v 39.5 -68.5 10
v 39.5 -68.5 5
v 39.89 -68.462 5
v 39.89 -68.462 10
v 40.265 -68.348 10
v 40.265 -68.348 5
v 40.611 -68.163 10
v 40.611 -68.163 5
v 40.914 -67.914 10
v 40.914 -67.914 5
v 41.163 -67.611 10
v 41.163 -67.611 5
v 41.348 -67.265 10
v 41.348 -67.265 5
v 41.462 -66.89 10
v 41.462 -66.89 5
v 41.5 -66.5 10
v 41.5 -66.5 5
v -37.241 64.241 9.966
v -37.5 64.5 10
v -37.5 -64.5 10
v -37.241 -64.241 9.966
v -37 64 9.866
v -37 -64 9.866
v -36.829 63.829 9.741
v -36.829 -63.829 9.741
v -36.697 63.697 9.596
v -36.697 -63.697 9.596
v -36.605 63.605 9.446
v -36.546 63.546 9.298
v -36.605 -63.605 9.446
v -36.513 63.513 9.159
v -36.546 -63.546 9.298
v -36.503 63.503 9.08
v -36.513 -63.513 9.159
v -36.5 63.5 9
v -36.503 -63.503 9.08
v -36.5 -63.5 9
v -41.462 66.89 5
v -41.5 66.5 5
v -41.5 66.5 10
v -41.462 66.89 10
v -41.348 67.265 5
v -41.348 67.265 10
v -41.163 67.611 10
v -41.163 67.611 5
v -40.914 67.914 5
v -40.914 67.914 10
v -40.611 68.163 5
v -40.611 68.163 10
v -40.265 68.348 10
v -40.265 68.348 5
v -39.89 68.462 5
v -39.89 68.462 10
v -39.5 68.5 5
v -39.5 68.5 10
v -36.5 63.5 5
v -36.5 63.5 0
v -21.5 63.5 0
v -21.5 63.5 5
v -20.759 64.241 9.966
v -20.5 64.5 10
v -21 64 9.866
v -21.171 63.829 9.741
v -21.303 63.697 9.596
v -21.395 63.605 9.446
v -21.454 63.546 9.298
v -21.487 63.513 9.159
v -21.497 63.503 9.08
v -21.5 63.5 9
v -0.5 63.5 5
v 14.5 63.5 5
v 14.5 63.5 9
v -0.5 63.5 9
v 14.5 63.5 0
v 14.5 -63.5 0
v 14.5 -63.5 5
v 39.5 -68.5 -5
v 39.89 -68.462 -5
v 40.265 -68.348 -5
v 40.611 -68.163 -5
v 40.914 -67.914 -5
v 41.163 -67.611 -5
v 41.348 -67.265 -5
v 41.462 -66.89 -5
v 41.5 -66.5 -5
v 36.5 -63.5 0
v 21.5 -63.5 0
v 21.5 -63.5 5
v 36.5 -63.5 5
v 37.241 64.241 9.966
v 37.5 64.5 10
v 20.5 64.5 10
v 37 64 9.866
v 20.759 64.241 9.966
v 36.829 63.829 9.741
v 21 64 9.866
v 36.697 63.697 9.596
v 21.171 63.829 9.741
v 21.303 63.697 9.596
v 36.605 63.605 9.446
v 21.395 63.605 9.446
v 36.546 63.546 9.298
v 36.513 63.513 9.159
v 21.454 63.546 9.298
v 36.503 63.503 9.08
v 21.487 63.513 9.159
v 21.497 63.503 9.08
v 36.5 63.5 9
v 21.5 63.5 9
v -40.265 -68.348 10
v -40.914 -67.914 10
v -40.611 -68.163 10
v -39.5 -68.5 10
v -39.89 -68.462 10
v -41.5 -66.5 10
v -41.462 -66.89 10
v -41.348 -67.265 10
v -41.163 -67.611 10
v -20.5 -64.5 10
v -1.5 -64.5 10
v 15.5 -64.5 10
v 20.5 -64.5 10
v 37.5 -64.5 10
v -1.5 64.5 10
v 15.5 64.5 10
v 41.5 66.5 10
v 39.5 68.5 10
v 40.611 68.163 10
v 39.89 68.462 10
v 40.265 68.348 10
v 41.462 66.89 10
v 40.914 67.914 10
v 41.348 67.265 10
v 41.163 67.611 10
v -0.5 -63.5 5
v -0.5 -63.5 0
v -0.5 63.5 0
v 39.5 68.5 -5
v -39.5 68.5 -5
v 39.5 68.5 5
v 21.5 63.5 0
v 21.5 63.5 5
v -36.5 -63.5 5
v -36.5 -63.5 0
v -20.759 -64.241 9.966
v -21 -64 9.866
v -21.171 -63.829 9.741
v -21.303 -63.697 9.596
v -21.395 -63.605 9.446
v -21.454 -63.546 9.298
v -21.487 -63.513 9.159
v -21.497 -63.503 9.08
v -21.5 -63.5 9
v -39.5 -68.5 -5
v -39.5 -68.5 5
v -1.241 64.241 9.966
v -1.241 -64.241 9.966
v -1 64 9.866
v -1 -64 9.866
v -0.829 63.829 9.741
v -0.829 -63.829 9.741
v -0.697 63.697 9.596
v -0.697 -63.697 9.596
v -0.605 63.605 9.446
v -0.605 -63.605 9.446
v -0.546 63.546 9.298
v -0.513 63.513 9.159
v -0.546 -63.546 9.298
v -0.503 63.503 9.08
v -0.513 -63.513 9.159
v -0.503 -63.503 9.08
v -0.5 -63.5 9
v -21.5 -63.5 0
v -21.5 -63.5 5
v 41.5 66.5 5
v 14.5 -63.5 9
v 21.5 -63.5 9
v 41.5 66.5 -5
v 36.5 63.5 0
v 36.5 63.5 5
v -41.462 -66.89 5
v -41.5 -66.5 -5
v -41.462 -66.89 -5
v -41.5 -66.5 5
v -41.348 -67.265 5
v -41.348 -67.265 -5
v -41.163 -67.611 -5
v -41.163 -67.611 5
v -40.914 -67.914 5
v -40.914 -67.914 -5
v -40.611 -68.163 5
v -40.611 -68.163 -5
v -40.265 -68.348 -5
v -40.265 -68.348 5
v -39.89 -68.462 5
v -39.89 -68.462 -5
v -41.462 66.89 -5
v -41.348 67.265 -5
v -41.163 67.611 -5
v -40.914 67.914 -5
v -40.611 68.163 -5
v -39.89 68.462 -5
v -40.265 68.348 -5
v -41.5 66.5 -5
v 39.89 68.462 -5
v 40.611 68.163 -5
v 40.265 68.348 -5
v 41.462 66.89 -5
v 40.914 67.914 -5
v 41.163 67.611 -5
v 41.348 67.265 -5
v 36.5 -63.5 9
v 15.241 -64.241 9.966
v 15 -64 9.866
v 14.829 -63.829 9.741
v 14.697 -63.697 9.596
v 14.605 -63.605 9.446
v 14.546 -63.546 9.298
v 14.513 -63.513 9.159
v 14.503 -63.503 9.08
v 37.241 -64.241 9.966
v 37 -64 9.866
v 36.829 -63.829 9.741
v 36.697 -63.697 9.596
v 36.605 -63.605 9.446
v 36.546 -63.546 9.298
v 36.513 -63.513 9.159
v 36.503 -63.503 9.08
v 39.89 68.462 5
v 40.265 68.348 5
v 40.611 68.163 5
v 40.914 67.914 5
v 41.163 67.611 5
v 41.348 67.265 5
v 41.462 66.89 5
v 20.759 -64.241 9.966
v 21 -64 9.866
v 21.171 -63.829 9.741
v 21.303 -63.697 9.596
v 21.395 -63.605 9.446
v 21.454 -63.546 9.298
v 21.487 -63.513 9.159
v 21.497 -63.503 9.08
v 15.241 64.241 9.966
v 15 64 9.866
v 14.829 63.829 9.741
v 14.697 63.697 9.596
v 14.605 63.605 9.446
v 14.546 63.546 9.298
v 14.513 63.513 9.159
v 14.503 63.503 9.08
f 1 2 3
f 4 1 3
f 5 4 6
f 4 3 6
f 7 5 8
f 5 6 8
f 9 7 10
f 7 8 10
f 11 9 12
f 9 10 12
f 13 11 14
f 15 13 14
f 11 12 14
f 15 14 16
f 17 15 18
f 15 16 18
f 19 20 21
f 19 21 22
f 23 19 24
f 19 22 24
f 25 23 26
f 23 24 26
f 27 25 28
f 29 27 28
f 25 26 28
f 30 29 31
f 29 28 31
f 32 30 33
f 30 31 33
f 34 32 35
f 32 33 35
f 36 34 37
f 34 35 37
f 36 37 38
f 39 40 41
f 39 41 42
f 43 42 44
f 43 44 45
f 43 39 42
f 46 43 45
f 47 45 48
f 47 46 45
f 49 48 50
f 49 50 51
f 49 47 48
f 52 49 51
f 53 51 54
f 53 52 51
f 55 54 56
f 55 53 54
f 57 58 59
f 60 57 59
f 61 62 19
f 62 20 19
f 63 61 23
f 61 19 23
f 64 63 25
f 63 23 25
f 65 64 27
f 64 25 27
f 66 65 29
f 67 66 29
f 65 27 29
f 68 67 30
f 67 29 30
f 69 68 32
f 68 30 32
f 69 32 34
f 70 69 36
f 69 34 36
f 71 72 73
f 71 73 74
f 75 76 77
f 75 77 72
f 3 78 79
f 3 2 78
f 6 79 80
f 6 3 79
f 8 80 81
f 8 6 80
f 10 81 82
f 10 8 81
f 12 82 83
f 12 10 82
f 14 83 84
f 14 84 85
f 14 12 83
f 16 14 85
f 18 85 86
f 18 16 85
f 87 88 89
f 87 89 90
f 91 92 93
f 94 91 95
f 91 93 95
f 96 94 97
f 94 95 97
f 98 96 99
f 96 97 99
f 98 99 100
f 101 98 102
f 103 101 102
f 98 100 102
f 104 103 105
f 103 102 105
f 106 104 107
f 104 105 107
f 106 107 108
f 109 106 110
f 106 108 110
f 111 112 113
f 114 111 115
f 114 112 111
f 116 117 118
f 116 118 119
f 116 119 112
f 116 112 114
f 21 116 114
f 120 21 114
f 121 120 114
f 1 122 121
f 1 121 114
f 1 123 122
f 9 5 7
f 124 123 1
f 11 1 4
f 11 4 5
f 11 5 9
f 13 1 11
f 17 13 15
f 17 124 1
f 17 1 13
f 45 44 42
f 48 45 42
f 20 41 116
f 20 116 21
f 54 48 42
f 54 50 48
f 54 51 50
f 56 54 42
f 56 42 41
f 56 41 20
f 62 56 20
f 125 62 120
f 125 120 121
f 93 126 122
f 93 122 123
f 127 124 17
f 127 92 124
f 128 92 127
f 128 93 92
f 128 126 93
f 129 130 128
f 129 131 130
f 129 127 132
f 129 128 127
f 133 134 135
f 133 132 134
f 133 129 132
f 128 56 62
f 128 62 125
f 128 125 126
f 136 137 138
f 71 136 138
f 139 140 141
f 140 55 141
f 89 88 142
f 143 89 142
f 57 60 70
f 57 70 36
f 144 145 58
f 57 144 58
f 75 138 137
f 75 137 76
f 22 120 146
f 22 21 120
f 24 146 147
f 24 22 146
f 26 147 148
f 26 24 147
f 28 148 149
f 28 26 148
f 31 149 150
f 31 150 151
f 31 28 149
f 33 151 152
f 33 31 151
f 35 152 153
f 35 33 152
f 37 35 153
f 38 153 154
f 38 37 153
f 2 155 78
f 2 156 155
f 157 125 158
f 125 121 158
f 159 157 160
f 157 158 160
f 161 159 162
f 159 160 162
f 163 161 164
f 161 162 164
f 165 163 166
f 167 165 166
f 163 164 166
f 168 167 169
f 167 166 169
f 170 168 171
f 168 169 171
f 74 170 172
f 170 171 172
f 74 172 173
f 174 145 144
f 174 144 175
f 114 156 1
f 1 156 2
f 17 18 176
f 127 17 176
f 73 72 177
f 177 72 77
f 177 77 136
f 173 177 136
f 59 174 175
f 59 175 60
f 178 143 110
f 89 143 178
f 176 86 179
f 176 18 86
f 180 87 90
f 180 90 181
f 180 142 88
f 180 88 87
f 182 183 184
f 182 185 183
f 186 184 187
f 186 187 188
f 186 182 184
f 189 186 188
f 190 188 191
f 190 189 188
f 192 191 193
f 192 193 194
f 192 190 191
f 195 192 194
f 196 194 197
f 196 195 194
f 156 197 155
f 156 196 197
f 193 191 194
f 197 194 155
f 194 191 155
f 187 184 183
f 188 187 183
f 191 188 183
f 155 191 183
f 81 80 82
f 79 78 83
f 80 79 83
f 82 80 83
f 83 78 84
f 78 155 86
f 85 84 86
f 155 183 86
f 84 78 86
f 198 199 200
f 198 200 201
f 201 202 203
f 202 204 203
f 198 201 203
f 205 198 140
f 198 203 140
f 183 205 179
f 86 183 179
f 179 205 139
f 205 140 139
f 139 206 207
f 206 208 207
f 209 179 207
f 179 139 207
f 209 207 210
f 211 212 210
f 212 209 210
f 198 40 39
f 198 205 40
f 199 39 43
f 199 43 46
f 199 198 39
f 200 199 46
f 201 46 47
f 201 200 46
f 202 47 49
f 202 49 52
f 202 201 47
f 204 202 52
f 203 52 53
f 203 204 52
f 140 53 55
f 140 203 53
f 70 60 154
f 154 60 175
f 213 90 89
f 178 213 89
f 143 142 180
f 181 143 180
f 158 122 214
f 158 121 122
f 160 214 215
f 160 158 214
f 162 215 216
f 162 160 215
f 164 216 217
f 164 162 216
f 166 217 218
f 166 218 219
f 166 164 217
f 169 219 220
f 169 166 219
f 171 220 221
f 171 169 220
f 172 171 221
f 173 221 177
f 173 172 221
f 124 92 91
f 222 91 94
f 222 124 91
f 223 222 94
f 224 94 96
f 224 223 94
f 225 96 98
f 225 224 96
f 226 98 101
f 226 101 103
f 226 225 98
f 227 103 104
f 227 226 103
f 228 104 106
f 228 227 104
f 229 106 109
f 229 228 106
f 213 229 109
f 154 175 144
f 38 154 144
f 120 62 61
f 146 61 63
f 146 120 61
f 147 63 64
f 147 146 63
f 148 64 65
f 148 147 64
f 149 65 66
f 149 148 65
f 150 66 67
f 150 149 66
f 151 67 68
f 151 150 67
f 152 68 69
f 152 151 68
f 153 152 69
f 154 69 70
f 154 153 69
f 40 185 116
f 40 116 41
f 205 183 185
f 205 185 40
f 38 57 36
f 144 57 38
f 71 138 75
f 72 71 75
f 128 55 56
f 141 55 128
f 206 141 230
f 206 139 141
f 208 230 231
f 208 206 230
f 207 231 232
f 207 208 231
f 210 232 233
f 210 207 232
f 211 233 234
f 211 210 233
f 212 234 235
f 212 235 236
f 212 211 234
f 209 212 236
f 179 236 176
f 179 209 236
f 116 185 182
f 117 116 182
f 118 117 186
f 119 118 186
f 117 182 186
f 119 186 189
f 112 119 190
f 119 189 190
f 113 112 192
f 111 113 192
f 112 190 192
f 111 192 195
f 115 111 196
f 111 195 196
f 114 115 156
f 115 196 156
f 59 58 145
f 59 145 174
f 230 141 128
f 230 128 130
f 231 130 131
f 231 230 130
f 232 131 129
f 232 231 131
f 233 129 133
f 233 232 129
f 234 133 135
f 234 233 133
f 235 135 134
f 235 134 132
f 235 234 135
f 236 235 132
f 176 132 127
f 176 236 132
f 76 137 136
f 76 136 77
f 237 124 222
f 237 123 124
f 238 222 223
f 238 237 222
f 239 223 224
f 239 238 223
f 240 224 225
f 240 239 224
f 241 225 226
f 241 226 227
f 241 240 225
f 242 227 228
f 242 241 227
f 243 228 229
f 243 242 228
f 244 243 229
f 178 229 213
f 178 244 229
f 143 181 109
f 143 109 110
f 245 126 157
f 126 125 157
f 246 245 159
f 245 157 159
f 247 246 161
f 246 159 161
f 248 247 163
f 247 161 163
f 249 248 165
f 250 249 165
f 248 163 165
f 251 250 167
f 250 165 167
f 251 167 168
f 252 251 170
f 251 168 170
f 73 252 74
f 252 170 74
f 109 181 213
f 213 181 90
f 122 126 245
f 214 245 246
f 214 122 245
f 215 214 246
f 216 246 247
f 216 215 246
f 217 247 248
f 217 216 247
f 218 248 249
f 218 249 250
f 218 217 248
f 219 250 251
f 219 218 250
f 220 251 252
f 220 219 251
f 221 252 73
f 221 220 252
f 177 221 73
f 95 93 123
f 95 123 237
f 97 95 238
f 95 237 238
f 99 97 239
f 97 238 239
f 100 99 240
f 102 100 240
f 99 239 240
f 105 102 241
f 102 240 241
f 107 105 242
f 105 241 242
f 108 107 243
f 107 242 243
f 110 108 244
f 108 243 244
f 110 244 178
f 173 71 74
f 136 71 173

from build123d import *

# Parameters (mm, degrees)
F1_W     = 83
F1_H     = 137
F2_DEPTH = 5
F0_W     = 15
F0_H     = 127
F3_DEPTH = 25
F4_R     = 2
F5_DEPTH = 5
F6_R     = 1


with BuildPart() as f2:
    # F1 (on Top) → F2 (new body, symmetric)
    with BuildSketch(Plane.XY):
        Rectangle(F1_W, F1_H)
    extrude(amount=F2_DEPTH, both=True)

    # F0 (on Top) → F3 (cut)
    with BuildSketch(Plane.XY):
        with Locations((-29, 0)):
            Rectangle(F0_W, F0_H)
        with Locations((29, 0)):
            Rectangle(F0_W, F0_H)
        with Locations((7, 0)):
            Rectangle(F0_W, F0_H)
    extrude(amount=F3_DEPTH, mode=Mode.SUBTRACT)

    # F4
    f4_edges = [f2.edges().sort_by_distance(p)[0] for p in [
        (-41.5, -68.5, 0),
        (41.5, -68.5, 0),
        (41.5, 68.5, 0),
        (-41.5, 68.5, 0),
    ]]
    fillet(f4_edges, radius=F4_R)

    # F5 (add): a face of the model
    f5_faces = [f2.faces().sort_by_distance(p)[0] for p in [
        (-2.3591054268, 0, 5),
    ]]
    extrude(f5_faces, amount=F5_DEPTH)

    # F6
    f6_edges = [f2.edges().sort_by_distance(p)[0] for p in [
        (-21.5, 0, 10),
        (-29, 63.5, 10),
        (-36.5, 0, 10),
        (-29, -63.5, 10),
        (-0.5, 0, 10),
        (14.5, 0, 10),
        (7, 63.5, 10),
        (7, -63.5, 10),
        (29, 63.5, 10),
        (21.5, 0, 10),
        (36.5, 0, 10),
        (29, -63.5, 10),
    ]]
    fillet(f6_edges, radius=F6_R)


solid = f2.part
